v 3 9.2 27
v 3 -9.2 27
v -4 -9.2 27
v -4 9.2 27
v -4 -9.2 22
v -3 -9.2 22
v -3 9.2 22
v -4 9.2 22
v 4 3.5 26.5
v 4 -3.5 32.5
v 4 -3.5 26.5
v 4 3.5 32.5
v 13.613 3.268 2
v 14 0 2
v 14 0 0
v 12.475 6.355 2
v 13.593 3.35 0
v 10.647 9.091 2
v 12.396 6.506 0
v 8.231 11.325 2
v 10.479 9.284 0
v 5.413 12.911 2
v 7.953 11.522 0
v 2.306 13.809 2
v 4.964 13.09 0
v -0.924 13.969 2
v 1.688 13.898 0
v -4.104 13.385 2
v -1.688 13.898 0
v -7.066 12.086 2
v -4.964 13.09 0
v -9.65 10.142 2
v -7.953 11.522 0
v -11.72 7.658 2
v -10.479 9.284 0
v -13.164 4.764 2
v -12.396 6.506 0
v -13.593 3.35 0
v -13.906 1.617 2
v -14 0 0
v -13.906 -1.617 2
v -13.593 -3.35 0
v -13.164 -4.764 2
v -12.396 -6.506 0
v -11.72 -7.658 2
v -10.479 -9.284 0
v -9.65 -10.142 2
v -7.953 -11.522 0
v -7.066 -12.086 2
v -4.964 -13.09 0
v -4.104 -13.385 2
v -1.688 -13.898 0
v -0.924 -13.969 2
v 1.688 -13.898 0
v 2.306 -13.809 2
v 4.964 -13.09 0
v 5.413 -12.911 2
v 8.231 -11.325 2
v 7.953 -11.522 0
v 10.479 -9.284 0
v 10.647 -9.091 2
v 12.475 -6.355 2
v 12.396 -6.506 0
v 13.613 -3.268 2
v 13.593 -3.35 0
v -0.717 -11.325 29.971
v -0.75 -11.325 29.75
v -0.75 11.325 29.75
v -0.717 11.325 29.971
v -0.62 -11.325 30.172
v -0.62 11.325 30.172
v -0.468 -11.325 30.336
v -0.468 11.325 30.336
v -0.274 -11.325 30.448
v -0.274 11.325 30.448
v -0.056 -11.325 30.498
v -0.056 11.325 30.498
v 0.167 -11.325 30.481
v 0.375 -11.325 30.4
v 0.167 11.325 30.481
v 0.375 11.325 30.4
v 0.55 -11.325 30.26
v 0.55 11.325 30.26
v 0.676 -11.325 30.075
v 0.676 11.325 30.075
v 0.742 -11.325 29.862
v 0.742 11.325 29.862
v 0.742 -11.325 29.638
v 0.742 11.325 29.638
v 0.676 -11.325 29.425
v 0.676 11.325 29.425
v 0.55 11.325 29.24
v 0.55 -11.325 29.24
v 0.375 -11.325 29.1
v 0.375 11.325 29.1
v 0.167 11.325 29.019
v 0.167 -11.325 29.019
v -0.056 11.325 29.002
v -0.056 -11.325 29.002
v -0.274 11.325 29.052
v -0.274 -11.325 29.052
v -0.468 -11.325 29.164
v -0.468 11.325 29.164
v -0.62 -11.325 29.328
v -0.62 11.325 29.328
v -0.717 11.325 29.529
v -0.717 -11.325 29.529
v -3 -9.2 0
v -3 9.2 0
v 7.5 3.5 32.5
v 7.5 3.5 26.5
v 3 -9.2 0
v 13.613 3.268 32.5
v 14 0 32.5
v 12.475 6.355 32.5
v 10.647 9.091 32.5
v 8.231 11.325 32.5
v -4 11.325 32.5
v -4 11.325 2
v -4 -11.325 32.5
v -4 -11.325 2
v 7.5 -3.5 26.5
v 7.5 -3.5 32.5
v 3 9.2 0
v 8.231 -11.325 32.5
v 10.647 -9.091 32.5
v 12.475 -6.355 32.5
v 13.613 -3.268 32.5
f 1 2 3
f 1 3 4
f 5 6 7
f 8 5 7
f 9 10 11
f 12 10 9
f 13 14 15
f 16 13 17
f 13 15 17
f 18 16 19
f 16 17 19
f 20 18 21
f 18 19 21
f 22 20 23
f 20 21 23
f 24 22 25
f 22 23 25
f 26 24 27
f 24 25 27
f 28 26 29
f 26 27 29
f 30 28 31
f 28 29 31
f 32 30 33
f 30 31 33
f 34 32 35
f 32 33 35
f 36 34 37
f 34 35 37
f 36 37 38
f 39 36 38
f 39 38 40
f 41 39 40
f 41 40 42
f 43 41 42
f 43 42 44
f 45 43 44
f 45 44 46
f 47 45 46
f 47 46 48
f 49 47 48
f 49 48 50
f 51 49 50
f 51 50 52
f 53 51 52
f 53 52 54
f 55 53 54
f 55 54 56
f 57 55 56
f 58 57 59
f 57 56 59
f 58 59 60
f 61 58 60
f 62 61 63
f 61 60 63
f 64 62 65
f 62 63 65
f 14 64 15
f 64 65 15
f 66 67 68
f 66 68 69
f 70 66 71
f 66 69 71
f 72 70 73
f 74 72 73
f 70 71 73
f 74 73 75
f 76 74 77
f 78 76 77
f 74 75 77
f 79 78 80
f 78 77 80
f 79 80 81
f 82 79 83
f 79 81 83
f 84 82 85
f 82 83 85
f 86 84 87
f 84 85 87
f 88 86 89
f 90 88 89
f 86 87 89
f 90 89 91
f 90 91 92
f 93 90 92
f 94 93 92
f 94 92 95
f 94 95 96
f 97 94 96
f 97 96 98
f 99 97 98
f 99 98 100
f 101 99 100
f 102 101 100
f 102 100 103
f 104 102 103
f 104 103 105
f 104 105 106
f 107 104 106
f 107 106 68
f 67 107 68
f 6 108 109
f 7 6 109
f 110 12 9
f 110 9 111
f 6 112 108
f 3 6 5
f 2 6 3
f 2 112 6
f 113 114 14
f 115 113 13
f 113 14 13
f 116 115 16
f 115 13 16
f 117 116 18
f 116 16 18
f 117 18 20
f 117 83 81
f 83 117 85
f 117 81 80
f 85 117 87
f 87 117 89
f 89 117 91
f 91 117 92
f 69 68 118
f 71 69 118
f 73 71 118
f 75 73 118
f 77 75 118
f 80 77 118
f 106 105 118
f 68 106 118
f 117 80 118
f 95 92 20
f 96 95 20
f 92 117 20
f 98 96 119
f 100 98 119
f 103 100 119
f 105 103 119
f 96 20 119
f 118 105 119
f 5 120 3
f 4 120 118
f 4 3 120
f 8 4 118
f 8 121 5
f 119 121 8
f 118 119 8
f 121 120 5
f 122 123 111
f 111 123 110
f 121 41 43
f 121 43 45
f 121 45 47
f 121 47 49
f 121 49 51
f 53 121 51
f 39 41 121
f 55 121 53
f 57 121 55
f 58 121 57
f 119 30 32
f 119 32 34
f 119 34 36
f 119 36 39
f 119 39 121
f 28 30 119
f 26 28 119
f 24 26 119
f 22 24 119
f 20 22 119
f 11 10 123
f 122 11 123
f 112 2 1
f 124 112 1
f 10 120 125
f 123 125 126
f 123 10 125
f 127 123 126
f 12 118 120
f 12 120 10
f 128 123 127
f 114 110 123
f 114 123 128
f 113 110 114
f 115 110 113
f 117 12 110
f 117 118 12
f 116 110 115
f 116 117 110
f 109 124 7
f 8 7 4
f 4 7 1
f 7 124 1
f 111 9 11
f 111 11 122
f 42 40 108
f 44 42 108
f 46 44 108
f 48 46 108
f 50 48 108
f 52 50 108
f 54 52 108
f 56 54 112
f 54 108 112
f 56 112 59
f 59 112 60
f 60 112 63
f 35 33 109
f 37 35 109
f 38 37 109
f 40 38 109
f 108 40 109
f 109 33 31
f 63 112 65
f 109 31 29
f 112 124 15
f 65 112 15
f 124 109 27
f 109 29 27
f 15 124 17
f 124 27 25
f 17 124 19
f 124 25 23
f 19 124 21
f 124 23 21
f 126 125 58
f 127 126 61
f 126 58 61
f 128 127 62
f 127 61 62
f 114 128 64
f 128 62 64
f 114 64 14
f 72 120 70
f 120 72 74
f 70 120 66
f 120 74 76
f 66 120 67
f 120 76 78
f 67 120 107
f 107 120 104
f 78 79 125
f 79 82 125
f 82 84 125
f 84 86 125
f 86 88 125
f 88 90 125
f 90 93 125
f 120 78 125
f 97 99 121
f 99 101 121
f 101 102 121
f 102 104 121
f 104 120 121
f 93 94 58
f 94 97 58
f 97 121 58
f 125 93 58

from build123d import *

# Parameters (mm, degrees)
SKETCH2_R           = 14
BOSS_EXTRUDE1_DEPTH = 2
SKETCH1_W           = 8
SKETCH1_H           = 22.649954628
SKETCH1_W_2         = 6
SKETCH1_H_2         = 18.4
BOSS_EXTRUDE2_DEPTH = 25
SKETCH3_W           = 8
SKETCH3_H           = 22.649954628
BOSS_EXTRUDE3_DEPTH = 5.5
SKETCH4_W           = 6
SKETCH4_H           = 18.4
CUT_EXTRUDE1_DEPTH  = 37.362755671
SKETCH5_W           = 5
SKETCH5_H           = 18.4
CUT_EXTRUDE2_DEPTH  = 40.258756985
SKETCH7_R           = 0.75
CUT_EXTRUDE3_DEPTH  = 44.515565904
BOSS_EXTRUDE4_DEPTH = 30.5
SKETCH9_W           = 3.5
SKETCH9_H           = 7
CUT_EXTRUDE4_DEPTH  = 6


with BuildPart() as part:
    # Sketch2 → Boss-Extrude1 (new body)
    with BuildSketch(Plane.XY):
        Circle(SKETCH2_R)
    extrude(amount=BOSS_EXTRUDE1_DEPTH)

    # Sketch1 → Boss-Extrude2 (add)
    with BuildSketch(Plane.XY.offset(2)):
        Rectangle(SKETCH1_W, SKETCH1_H)
        Rectangle(SKETCH1_W_2, SKETCH1_H_2, mode=Mode.SUBTRACT)
    extrude(amount=BOSS_EXTRUDE2_DEPTH)

    # Sketch3 → Boss-Extrude3 (add)
    with BuildSketch(Plane.XY.offset(27)):
        Rectangle(SKETCH3_W, SKETCH3_H)
    extrude(amount=BOSS_EXTRUDE3_DEPTH)

    # Sketch4 → Cut-Extrude1 (cut, through all)
    with BuildSketch(Plane.XY.offset(2)):
        Rectangle(SKETCH4_W, SKETCH4_H)
    extrude(amount=-CUT_EXTRUDE1_DEPTH, mode=Mode.SUBTRACT)

    # Sketch5 → Cut-Extrude2 (cut, through all)
    with BuildSketch(Plane.ZY.offset(-3)):
        with Locations((24.5, 0)):
            Rectangle(SKETCH5_W, SKETCH5_H)
    extrude(amount=CUT_EXTRUDE2_DEPTH, mode=Mode.SUBTRACT)

    # Sketch7 → Cut-Extrude3 (cut, through all)
    with BuildSketch(Plane(origin=(0, 11.324977314, 0), x_dir=(1, 0, 0), z_dir=(0, 1, 0))):
        with Locations(Location((0, -29.75, 0), (0, 0, 180))):
            Circle(SKETCH7_R)
    extrude(amount=-CUT_EXTRUDE3_DEPTH, mode=Mode.SUBTRACT)

    # Sketch8 → Boss-Extrude4 (add)
    with BuildSketch(Plane.XY.offset(2)):
        with BuildLine():
            Line((4, 11.324977314), (4, -11.324977314))
            Line((4, -11.324977314), (8.23072833, -11.324977314))
            ThreePointArc((8.23072833, -11.324977314), (12.474578081, -6.354911619), (14, 0))
            ThreePointArc((14, 0), (12.474578081, 6.354911619), (8.23072833, 11.324977314))
            Line((8.23072833, 11.324977314), (4, 11.324977314))
        make_face()
    extrude(amount=BOSS_EXTRUDE4_DEPTH)

    # Sketch9 → Cut-Extrude4 (cut)
    with BuildSketch(Plane.XY.offset(32.5)):
        with Locations((5.75, 0)):
            Rectangle(SKETCH9_W, SKETCH9_H)
    extrude(amount=-CUT_EXTRUDE4_DEPTH, mode=Mode.SUBTRACT)


solid = part.part
